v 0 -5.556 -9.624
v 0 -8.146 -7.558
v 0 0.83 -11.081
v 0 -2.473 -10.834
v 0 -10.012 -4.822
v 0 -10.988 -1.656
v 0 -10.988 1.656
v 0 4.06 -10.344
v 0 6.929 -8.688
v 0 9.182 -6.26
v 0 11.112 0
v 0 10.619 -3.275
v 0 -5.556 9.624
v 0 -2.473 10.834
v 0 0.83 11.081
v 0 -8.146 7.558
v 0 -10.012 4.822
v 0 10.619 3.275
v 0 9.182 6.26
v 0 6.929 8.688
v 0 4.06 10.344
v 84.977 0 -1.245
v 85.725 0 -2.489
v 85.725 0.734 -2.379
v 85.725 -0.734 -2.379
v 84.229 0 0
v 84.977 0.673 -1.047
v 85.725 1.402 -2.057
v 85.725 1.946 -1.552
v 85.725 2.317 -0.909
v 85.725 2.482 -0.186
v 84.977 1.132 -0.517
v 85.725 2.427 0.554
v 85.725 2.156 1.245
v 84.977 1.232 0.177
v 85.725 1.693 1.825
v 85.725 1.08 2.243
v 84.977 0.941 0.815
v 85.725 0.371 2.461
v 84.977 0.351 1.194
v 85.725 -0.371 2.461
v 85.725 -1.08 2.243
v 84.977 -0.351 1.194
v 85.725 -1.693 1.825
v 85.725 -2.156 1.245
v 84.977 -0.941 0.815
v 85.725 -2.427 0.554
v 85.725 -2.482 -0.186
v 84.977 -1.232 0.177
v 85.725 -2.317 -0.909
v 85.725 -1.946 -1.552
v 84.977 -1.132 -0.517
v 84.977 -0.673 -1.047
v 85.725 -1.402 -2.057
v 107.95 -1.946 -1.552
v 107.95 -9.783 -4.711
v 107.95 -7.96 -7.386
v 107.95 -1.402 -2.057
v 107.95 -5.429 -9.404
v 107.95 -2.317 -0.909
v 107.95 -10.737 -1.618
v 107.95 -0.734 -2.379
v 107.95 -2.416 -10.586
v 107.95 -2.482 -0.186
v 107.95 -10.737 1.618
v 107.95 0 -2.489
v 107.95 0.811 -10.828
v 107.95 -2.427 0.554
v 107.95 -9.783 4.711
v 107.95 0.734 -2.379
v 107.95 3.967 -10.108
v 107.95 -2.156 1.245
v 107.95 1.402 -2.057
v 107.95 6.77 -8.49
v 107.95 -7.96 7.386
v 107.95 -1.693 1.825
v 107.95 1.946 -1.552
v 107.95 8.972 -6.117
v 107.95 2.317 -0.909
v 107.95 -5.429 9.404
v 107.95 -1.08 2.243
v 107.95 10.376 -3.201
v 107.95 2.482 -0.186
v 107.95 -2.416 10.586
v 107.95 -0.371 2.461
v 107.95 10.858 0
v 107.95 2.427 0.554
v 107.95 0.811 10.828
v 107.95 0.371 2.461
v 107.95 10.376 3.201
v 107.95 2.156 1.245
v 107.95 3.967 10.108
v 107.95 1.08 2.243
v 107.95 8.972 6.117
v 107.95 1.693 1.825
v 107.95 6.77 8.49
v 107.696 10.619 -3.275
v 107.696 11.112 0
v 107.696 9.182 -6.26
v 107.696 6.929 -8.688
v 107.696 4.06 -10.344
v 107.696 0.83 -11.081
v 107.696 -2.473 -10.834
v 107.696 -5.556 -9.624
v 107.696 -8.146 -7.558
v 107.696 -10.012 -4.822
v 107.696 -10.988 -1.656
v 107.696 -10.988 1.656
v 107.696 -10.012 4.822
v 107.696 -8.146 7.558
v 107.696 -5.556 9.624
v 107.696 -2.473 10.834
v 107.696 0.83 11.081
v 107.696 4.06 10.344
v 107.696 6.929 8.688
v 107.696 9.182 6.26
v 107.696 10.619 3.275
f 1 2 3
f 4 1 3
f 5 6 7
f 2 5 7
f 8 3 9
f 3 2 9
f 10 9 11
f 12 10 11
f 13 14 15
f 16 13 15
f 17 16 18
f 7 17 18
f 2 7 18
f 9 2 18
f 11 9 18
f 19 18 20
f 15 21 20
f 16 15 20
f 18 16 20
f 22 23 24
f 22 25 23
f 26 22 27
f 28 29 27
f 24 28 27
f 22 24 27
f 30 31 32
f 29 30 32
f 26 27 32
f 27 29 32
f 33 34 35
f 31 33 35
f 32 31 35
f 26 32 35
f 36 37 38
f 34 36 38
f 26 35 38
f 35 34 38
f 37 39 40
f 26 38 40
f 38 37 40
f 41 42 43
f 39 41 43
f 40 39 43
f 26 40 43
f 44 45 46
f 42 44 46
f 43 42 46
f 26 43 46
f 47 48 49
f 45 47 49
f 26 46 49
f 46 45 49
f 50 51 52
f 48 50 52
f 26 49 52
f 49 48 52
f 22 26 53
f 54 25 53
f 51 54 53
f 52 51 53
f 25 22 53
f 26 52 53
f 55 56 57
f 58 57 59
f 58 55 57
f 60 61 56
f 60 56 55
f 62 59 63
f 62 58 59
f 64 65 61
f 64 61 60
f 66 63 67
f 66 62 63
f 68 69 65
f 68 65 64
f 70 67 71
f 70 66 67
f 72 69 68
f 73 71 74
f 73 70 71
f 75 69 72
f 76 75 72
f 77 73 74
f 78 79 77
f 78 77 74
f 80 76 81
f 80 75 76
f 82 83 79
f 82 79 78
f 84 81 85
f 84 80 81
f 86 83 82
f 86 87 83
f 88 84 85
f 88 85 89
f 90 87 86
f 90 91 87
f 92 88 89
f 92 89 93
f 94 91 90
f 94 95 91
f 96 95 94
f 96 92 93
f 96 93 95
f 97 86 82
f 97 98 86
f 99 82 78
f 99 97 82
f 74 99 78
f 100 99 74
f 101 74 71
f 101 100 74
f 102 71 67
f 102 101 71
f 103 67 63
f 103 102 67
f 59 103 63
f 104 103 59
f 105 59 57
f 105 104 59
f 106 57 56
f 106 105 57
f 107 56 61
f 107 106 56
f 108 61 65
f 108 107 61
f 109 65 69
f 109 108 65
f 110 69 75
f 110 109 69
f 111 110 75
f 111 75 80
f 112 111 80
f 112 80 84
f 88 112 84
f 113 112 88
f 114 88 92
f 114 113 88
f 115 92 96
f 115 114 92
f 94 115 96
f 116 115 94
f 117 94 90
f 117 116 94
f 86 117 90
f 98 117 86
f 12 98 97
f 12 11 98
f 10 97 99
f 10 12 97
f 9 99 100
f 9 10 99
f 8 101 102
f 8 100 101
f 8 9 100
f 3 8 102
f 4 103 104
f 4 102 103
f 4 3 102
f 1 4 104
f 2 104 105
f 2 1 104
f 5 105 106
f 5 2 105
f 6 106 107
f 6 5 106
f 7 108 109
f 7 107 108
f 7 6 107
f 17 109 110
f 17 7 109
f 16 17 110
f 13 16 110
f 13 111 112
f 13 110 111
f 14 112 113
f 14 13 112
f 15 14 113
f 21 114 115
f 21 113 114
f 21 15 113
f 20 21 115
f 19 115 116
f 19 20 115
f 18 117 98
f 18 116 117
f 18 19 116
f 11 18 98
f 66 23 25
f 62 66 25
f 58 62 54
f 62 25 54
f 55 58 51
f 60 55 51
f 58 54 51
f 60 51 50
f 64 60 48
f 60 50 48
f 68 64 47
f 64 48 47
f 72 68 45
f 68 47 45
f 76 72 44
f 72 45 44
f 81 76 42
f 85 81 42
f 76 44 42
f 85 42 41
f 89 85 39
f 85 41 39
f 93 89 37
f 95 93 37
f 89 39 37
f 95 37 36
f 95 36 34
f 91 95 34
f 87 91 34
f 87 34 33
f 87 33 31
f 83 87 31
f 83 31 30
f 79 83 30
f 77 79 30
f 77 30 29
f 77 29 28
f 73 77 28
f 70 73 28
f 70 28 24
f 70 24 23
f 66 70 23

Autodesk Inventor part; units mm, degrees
ref_plane "YZ Plane" through (0, 0, 0) normal (1, 0, 0) x (0, 1, 0)
ref_plane "XZ Plane" through (0, 0, 0) normal (0, 1, 0) x (-1, 0, 0)
ref_plane "XY Plane" through (0, 0, 0) normal (0, 0, 1) x (1, 0, 0)
sketch "Sketch1" plane through (0, 0, 0) normal (1, 0, 0) x (0, 1, 0)
  circle A0 centre (0, 0) radius 11.1125
  dimension "d0" = 22.225
extrude "Extrusion1" add sketch "Sketch1" along normal blind 107.95
chamfer "Chamfer1" distance 0.254 angle 45 1 edges at (107.95, -11.1125, 0)
sketch "Sketch2" plane through (107.95, 0, 0) normal (1, 0, 0) x (0, 0, -1)
  circle A0 centre (0, 0) radius 11.1125 projected
hole "Hole1" at (107.95, 0, 0) direction (-1, 0, 0) diameter 4.9784 depth 22.225 tip angle 118 thread size "1/4-20 UNC" class "2B" standard "ANSI Unified Screw Threads"
properties material "Aluminum 6061"
